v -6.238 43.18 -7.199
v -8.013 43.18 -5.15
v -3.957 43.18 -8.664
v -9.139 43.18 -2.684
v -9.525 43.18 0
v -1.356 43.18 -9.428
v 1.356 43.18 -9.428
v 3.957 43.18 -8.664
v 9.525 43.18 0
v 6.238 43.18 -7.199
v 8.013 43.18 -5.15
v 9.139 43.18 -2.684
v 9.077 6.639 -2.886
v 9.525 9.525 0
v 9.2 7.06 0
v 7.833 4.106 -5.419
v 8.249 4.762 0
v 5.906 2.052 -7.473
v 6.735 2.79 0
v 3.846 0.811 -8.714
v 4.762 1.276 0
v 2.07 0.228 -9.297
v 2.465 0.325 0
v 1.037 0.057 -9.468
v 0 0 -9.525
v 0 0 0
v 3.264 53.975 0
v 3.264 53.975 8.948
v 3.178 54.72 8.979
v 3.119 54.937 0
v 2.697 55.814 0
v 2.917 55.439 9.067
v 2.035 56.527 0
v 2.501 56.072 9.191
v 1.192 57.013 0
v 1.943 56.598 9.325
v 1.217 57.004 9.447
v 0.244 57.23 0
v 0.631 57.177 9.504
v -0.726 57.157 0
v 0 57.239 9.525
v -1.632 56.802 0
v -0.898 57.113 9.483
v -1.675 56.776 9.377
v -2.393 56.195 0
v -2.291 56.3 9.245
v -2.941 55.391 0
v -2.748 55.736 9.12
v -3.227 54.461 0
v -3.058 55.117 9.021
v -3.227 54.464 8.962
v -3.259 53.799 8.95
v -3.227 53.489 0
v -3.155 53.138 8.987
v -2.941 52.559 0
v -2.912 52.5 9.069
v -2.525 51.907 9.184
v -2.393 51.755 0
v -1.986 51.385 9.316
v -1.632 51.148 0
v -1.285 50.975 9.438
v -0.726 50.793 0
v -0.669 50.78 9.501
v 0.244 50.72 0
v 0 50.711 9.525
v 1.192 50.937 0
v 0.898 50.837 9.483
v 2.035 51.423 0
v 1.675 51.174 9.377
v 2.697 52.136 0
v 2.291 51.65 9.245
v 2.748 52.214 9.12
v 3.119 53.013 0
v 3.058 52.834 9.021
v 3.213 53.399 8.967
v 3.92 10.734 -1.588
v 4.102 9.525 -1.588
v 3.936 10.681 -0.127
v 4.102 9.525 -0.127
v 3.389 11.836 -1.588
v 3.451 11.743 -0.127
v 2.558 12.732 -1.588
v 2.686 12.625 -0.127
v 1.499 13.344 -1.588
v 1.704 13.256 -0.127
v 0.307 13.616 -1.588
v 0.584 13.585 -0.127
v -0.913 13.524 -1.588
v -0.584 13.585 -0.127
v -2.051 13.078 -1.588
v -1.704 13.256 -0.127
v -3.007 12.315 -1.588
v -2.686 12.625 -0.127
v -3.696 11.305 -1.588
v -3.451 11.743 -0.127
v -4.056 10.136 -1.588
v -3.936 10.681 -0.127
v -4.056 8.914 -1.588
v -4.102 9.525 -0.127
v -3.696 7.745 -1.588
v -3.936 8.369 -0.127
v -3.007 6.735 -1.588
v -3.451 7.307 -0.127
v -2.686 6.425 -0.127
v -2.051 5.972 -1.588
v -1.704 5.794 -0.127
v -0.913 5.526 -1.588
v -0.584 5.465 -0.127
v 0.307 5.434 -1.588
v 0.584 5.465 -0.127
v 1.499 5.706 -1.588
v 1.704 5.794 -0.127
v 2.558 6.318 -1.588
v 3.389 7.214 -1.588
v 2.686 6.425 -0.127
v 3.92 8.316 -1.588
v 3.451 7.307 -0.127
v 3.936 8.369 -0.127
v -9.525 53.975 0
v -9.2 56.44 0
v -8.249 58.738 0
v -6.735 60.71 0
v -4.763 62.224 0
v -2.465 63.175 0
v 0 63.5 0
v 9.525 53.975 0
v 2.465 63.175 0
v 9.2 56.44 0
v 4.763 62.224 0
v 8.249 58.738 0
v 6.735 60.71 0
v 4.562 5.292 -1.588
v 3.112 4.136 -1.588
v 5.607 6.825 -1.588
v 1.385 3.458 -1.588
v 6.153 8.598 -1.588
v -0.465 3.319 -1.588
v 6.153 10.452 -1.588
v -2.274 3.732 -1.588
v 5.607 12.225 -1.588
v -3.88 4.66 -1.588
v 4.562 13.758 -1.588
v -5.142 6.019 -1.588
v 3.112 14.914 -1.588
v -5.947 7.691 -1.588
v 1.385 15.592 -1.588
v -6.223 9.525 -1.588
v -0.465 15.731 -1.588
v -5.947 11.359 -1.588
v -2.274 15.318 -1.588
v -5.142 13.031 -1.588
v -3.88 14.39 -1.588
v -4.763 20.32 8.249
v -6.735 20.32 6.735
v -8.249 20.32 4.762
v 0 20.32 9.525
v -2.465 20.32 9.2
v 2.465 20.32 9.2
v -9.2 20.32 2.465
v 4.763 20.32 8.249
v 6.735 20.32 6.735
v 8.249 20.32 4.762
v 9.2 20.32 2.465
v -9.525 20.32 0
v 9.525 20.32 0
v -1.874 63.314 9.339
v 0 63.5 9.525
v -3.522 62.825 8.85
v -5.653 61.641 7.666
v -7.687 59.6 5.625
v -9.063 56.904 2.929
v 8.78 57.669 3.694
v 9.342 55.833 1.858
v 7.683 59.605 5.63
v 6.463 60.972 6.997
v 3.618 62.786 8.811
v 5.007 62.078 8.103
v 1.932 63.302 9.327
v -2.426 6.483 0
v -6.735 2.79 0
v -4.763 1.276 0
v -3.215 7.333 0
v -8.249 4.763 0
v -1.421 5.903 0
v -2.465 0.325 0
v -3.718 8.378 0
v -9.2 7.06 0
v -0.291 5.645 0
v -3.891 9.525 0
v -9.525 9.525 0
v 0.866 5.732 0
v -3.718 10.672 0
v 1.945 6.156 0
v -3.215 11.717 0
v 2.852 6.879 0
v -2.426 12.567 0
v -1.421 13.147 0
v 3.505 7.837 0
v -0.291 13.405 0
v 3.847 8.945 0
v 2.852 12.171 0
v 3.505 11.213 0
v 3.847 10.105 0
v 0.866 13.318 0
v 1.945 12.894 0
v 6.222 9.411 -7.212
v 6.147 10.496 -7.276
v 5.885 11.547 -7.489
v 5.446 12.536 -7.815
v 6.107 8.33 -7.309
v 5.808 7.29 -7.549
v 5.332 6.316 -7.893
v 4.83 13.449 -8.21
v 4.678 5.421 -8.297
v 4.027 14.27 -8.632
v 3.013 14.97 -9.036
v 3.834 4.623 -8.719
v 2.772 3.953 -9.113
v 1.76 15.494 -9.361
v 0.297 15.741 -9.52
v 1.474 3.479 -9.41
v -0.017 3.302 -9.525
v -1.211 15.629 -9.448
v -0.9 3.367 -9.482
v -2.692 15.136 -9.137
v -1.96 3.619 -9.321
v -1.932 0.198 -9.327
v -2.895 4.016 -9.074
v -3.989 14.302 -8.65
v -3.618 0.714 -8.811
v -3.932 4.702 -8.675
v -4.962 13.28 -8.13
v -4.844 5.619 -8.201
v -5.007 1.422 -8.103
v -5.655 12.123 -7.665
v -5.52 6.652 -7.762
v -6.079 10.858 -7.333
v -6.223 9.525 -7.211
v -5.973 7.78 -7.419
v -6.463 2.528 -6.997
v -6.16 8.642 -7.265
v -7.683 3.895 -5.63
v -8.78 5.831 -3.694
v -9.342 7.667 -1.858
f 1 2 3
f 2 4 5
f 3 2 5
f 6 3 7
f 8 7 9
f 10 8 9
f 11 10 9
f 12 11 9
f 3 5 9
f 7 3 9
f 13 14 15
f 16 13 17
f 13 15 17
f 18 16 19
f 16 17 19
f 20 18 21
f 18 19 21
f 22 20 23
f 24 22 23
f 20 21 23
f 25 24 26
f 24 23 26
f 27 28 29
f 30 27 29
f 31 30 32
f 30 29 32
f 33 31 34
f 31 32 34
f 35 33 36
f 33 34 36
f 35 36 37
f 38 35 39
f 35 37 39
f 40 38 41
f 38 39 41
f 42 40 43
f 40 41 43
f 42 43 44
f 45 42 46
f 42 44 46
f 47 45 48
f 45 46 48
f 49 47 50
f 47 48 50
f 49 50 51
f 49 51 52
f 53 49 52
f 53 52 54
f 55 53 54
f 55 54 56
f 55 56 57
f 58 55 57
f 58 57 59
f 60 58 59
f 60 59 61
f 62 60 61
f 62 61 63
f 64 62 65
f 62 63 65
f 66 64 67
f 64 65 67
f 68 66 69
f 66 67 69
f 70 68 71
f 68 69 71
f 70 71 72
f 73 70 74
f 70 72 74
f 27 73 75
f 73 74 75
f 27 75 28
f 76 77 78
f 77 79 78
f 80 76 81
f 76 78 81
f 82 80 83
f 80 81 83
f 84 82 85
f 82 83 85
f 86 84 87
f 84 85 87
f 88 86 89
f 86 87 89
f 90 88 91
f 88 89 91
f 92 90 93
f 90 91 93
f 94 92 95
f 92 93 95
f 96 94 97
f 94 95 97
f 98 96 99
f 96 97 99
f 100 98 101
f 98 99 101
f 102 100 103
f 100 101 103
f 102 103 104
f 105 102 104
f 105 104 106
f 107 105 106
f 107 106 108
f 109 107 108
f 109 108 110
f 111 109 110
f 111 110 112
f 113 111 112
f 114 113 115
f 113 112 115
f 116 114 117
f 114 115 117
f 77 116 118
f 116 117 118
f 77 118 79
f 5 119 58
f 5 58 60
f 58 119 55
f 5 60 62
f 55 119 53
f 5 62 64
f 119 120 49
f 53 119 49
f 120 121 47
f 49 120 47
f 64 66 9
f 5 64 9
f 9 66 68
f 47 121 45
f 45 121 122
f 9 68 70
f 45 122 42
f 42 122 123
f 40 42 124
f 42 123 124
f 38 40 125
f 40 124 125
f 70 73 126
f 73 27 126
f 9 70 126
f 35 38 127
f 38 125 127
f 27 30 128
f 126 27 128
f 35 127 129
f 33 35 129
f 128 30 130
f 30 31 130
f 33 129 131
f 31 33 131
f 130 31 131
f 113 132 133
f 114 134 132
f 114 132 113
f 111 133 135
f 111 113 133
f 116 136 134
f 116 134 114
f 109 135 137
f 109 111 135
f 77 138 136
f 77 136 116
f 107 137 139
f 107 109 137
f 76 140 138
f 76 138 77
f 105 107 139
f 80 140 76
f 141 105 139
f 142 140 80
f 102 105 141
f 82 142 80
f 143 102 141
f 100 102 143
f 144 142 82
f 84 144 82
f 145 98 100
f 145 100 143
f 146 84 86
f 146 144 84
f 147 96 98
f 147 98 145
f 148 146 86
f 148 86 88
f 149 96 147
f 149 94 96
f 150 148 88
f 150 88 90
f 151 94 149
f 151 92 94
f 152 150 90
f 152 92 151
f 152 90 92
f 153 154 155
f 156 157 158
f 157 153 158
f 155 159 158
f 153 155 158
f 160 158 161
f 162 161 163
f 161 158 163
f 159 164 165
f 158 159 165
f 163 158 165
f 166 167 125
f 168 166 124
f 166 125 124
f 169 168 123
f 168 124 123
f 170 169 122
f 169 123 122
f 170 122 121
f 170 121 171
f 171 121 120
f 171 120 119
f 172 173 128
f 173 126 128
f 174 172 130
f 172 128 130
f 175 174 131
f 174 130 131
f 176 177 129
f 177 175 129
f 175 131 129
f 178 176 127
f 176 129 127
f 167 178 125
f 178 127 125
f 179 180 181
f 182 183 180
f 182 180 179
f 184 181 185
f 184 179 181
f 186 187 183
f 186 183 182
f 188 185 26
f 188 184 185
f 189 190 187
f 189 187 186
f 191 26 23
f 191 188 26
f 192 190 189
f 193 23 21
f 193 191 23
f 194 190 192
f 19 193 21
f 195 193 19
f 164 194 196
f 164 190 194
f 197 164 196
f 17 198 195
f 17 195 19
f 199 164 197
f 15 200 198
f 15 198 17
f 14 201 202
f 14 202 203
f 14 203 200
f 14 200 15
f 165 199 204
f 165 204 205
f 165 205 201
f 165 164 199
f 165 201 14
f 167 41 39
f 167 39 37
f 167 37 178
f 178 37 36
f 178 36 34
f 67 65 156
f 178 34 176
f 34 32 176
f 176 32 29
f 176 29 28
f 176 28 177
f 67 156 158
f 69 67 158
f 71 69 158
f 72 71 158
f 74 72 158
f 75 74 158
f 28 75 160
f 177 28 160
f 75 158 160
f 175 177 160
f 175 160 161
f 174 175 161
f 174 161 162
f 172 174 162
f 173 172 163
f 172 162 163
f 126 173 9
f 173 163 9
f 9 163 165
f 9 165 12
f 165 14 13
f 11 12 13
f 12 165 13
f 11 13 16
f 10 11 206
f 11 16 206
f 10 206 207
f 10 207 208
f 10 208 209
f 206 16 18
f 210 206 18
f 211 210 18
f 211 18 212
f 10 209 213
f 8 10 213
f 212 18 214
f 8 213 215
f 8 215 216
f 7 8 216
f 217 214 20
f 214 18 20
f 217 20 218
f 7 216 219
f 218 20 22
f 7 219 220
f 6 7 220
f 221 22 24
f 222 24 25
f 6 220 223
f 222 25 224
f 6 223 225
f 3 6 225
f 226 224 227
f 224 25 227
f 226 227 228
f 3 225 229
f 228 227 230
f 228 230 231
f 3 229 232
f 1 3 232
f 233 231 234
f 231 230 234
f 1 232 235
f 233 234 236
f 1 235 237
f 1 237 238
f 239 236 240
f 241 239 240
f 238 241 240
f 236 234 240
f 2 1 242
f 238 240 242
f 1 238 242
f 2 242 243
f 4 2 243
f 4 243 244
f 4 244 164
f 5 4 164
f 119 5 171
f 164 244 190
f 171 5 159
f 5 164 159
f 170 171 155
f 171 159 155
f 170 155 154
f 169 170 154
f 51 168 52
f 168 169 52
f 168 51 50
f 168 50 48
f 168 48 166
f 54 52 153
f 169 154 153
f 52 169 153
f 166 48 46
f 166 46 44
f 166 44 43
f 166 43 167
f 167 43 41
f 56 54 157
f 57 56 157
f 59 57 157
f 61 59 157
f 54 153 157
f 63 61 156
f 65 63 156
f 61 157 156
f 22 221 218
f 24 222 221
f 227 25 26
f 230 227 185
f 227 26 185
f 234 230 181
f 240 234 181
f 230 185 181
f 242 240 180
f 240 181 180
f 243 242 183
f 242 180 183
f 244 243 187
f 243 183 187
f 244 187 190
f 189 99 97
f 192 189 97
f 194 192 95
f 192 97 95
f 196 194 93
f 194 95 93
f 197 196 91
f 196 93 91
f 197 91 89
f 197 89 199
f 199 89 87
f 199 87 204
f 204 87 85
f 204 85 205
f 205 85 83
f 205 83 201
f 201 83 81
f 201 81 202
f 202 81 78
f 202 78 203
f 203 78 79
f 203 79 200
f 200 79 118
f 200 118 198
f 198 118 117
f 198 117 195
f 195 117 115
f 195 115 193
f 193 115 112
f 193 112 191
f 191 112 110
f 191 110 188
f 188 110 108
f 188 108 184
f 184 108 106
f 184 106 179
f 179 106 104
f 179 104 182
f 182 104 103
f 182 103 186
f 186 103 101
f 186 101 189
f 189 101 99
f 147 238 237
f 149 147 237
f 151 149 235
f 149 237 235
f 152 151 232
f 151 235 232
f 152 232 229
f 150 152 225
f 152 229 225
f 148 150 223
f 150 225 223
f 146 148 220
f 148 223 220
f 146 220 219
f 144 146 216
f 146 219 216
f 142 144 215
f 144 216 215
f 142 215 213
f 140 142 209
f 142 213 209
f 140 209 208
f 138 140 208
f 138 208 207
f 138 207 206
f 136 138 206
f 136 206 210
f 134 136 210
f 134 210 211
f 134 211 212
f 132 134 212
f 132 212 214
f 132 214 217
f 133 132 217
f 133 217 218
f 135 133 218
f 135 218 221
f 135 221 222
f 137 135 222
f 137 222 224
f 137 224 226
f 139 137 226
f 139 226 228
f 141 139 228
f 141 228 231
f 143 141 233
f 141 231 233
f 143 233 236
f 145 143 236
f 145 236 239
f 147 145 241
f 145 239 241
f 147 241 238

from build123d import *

# Parameters (mm, degrees)
CROQUIS1_R                                           = 9.525
SALIENTE_EXTRUIR1_DEPTH                              = 63.5
CROQUIS2_W                                           = 19.05
CROQUIS2_H                                           = 20.32
CORTAR_EXTRUIR1_DEPTH                                = 15.748
CORTAR_EXTRUIR2_DEPTH                                = 15.748
TALADRO_ROSCADO_5_16_181_D                           = 6.5278
TALADRO_ROSCADO_5_16_181_DEPTH                       = 22.9235
TALADRO_ROSCADO_5_16_181_TIP                         = 1.961148974
CROQUIS6_W                                           = 19.05
CROQUIS6_H                                           = 20.32
CORTAR_EXTRUIR3_DEPTH                                = 19.05
CORTAR_EXTRUIR4_DEPTH                                = 19.05
REFRENTADO_PARA_TORNILLO_CON_CABEZA_HUEC_D           = 8.2042
REFRENTADO_PARA_TORNILLO_CON_CABEZA_HUEC_DEPTH       = 9.398
REFRENTADO_PARA_TORNILLO_CON_CABEZA_HUEC_CBORE_D     = 12.446
REFRENTADO_PARA_TORNILLO_CON_CABEZA_HUEC_CBORE_DEPTH = 7.9375
REFRENTADO_PARA_TORNILLO_CON_CABEZA_HUEC_TIP         = 2.464790345


with BuildPart() as part:
    # Croquis1 → Saliente-Extruir1 (new body)
    with BuildSketch(Plane(origin=(0, 0, 0), x_dir=(1, 0, 0), z_dir=(0, 1, 0))):
        with Locations(Location((0, 0, 0), (0, 0, 270))):
            Circle(CROQUIS1_R)
    extrude(amount=SALIENTE_EXTRUIR1_DEPTH)

    # Croquis2 → Cortar-Extruir1 (cut)
    with BuildSketch(Plane.XY):
        with Locations((0, 53.34)):
            Rectangle(CROQUIS2_W, CROQUIS2_H)
    extrude(amount=-CORTAR_EXTRUIR1_DEPTH, mode=Mode.SUBTRACT)

    # Croquis3 → Cortar-Extruir2 (cut)
    with BuildSketch(Plane(origin=(0, 0, 0), x_dir=(-1, 0, 0), z_dir=(0, 0, -1))):
        with BuildLine():
            Line((-9.525, 63.5), (-9.525, 53.975))
            ThreePointArc((-9.525, 53.975), (-6.735192091, 60.710192091), (0, 63.5))
            Line((0, 63.5), (-9.525, 63.5))
        make_face()
        with BuildLine():
            Line((9.525, 63.5), (0, 63.5))
            ThreePointArc((0, 63.5), (6.735192091, 60.710192091), (9.525, 53.975))
            Line((9.525, 53.975), (9.525, 63.5))
        make_face()
    extrude(amount=-CORTAR_EXTRUIR2_DEPTH, mode=Mode.SUBTRACT)

    # Taladro roscado 5/16-181
    with Locations(Plane(origin=(0, 0, 0), x_dir=(-1, 0, 0), z_dir=(0, 0, -1))):
        with Locations((0, 53.975)):
            Hole(TALADRO_ROSCADO_5_16_181_D / 2, depth=TALADRO_ROSCADO_5_16_181_DEPTH)
            with Locations((0, 0, -(TALADRO_ROSCADO_5_16_181_DEPTH + TALADRO_ROSCADO_5_16_181_TIP / 2))):  # 118° drill point
                Cone(0, TALADRO_ROSCADO_5_16_181_D / 2, TALADRO_ROSCADO_5_16_181_TIP, mode=Mode.SUBTRACT)

    # Croquis6 → Cortar-Extruir3 (cut)
    with BuildSketch(Plane.XY):
        with Locations((0, 10.16)):
            Rectangle(CROQUIS6_W, CROQUIS6_H)
    extrude(amount=CORTAR_EXTRUIR3_DEPTH, mode=Mode.SUBTRACT)

    # Croquis7 → Cortar-Extruir4 (cut)
    with BuildSketch(Plane.XY):
        with BuildLine():
            ThreePointArc((-3.4e-08, 0), (-6.735192103, 2.789807921), (-9.525, 9.525))
            Line((-9.525, 9.525), (-9.525, 0))
            Line((-9.525, 0), (-3.4e-08, 0))
        make_face()
        with BuildLine():
            ThreePointArc((9.525, 9.525), (6.735192079, 2.789807897), (-3.4e-08, 0))
            Line((-3.4e-08, 0), (9.525, 0))
            Line((9.525, 0), (9.525, 9.525))
        make_face()
    extrude(amount=-CORTAR_EXTRUIR4_DEPTH, mode=Mode.SUBTRACT)

    # Refrentado para tornillo con cabeza hueca de 5/161
    with Locations(Plane(origin=(0, 0, -9.525), x_dir=(-1, 0, 0), z_dir=(0, 0, -1))):
        with Locations((0, 9.525)):
            CounterBoreHole(REFRENTADO_PARA_TORNILLO_CON_CABEZA_HUEC_D / 2, REFRENTADO_PARA_TORNILLO_CON_CABEZA_HUEC_CBORE_D / 2, REFRENTADO_PARA_TORNILLO_CON_CABEZA_HUEC_CBORE_DEPTH, depth=REFRENTADO_PARA_TORNILLO_CON_CABEZA_HUEC_DEPTH)
            with Locations((0, 0, -(REFRENTADO_PARA_TORNILLO_CON_CABEZA_HUEC_DEPTH + REFRENTADO_PARA_TORNILLO_CON_CABEZA_HUEC_TIP / 2))):  # 118° drill point
                Cone(0, REFRENTADO_PARA_TORNILLO_CON_CABEZA_HUEC_D / 2, REFRENTADO_PARA_TORNILLO_CON_CABEZA_HUEC_TIP, mode=Mode.SUBTRACT)


solid = part.part
